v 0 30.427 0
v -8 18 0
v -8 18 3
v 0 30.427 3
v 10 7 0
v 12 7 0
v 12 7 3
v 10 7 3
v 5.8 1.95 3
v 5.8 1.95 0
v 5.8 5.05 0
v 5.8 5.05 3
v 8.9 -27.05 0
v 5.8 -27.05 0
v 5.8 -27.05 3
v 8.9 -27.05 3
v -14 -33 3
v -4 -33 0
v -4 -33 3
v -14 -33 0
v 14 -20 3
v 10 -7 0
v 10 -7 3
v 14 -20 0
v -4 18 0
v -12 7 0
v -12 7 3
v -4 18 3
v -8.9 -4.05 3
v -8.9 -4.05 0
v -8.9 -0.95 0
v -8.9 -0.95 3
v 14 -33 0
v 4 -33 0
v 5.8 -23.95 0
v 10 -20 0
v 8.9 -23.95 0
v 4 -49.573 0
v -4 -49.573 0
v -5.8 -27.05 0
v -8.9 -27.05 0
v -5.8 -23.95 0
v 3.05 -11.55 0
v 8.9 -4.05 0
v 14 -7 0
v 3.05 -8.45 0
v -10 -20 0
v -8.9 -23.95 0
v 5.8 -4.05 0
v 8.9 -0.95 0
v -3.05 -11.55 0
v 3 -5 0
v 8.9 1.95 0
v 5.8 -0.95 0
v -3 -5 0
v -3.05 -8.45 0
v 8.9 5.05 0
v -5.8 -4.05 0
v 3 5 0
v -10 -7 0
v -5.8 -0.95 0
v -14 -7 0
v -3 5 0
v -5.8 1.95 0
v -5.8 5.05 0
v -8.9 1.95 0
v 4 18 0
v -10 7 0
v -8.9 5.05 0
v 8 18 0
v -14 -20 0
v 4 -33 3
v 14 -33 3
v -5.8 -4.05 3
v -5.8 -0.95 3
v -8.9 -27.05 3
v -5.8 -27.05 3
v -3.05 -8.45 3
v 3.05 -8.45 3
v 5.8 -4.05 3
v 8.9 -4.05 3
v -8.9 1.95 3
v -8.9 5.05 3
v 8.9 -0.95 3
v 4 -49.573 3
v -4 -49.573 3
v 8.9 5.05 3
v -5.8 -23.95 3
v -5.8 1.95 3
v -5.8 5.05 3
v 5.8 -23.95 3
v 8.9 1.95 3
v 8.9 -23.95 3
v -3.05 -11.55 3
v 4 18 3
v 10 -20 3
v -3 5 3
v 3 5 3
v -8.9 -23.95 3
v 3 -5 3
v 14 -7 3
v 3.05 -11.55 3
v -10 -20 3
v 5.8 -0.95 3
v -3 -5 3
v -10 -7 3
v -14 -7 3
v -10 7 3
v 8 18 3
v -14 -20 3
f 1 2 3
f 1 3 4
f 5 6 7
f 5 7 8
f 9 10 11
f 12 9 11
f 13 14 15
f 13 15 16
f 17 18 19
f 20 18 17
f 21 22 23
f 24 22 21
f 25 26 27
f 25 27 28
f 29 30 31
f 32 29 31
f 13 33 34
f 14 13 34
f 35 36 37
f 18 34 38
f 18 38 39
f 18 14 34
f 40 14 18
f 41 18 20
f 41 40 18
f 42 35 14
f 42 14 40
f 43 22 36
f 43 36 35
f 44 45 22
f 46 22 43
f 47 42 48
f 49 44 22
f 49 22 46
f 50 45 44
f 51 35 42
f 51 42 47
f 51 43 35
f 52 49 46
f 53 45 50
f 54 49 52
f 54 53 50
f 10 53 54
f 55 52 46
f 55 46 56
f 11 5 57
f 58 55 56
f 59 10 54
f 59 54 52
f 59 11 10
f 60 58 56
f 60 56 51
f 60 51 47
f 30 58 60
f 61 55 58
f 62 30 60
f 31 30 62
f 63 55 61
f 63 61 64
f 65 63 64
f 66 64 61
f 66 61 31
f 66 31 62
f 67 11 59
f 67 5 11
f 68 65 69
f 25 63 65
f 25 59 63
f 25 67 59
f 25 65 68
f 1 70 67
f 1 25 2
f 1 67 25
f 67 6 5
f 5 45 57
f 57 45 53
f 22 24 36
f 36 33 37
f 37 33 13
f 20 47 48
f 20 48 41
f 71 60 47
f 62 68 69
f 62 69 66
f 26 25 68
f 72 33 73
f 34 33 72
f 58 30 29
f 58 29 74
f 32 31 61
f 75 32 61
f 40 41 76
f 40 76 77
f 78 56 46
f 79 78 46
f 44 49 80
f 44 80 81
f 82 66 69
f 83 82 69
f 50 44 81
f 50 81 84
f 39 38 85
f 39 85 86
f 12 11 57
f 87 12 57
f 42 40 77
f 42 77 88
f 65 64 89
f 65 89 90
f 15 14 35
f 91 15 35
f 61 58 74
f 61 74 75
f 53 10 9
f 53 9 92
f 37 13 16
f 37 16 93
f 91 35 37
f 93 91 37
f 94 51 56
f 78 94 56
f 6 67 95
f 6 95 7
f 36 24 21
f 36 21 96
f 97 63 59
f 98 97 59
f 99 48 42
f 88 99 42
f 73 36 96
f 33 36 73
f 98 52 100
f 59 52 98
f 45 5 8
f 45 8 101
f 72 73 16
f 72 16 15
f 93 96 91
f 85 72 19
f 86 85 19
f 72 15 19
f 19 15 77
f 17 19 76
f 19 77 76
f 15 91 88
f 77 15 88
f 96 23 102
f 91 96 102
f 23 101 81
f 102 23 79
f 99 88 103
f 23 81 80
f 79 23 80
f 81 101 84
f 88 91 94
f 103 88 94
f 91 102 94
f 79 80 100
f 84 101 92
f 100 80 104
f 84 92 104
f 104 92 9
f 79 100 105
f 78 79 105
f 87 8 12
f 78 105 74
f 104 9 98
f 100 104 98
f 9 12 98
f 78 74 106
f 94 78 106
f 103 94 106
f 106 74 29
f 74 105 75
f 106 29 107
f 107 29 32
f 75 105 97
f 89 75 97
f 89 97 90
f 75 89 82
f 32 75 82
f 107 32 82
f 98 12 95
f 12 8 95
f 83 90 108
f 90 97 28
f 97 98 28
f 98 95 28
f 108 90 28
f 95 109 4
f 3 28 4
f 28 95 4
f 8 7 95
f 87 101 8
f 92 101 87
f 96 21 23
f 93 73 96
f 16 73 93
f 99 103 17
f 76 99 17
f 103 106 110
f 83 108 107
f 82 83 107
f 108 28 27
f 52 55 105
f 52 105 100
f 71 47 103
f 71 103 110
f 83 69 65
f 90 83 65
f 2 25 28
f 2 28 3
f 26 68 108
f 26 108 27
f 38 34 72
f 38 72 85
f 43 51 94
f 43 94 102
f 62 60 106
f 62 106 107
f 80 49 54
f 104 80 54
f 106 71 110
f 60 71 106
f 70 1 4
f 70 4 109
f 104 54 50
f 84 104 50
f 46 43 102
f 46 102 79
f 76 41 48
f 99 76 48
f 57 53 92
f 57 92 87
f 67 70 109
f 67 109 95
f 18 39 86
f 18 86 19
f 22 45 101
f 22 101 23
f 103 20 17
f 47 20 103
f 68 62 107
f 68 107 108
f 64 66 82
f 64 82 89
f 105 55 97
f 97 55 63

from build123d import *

# Parameters (mm, degrees)
PROFILE_LASER_PROFILE_3MM_W   = 3.1
PROFILE_LASER_PROFILE_3MM_H   = 3.1
PROFILE_LASER_PROFILE_3MM_W_2 = 6.1
PROFILE_LASER_PROFILE_3MM_W_3 = 6
PROFILE_LASER_PROFILE_3MM_H_2 = 10
LASER_PROFILE_3MM_DEPTH       = 3


with BuildPart() as part:
    # Profile_Laser_profile_3mm → Laser_profile_3mm (new body)
    with BuildSketch(Plane.XY):
        Polygon((0, 30.427227289), (8, 18), (4, 18), (12, 7), (10, 7), (14, -7), (10, -7), (14, -20), (10, -20), (14, -33), (4, -33), (4, -49.572772711), (-4, -49.572772711), (-4, -33), (-14, -33), (-10, -20), (-14, -20), (-10, -7), (-14, -7), (-10, 7), (-12, 7), (-4, 18), (-8, 18), align=None)
        with Locations((-7.35, 3.5)):
            Rectangle(PROFILE_LASER_PROFILE_3MM_W, PROFILE_LASER_PROFILE_3MM_H, mode=Mode.SUBTRACT)
        with Locations((-7.35, -2.5)):
            Rectangle(PROFILE_LASER_PROFILE_3MM_W, PROFILE_LASER_PROFILE_3MM_H, mode=Mode.SUBTRACT)
        with Locations((-7.35, -25.5)):
            Rectangle(PROFILE_LASER_PROFILE_3MM_W, PROFILE_LASER_PROFILE_3MM_H, mode=Mode.SUBTRACT)
        with Locations((7.35, 3.5)):
            Rectangle(PROFILE_LASER_PROFILE_3MM_W, PROFILE_LASER_PROFILE_3MM_H, mode=Mode.SUBTRACT)
        with Locations((7.35, -2.5)):
            Rectangle(PROFILE_LASER_PROFILE_3MM_W, PROFILE_LASER_PROFILE_3MM_H, mode=Mode.SUBTRACT)
        with Locations((7.35, -25.5)):
            Rectangle(PROFILE_LASER_PROFILE_3MM_W, PROFILE_LASER_PROFILE_3MM_H, mode=Mode.SUBTRACT)
        with Locations((0, -10)):
            Rectangle(PROFILE_LASER_PROFILE_3MM_W_2, PROFILE_LASER_PROFILE_3MM_H, mode=Mode.SUBTRACT)
        Rectangle(PROFILE_LASER_PROFILE_3MM_W_3, PROFILE_LASER_PROFILE_3MM_H_2, mode=Mode.SUBTRACT)
    extrude(amount=LASER_PROFILE_3MM_DEPTH)


solid = part.part
